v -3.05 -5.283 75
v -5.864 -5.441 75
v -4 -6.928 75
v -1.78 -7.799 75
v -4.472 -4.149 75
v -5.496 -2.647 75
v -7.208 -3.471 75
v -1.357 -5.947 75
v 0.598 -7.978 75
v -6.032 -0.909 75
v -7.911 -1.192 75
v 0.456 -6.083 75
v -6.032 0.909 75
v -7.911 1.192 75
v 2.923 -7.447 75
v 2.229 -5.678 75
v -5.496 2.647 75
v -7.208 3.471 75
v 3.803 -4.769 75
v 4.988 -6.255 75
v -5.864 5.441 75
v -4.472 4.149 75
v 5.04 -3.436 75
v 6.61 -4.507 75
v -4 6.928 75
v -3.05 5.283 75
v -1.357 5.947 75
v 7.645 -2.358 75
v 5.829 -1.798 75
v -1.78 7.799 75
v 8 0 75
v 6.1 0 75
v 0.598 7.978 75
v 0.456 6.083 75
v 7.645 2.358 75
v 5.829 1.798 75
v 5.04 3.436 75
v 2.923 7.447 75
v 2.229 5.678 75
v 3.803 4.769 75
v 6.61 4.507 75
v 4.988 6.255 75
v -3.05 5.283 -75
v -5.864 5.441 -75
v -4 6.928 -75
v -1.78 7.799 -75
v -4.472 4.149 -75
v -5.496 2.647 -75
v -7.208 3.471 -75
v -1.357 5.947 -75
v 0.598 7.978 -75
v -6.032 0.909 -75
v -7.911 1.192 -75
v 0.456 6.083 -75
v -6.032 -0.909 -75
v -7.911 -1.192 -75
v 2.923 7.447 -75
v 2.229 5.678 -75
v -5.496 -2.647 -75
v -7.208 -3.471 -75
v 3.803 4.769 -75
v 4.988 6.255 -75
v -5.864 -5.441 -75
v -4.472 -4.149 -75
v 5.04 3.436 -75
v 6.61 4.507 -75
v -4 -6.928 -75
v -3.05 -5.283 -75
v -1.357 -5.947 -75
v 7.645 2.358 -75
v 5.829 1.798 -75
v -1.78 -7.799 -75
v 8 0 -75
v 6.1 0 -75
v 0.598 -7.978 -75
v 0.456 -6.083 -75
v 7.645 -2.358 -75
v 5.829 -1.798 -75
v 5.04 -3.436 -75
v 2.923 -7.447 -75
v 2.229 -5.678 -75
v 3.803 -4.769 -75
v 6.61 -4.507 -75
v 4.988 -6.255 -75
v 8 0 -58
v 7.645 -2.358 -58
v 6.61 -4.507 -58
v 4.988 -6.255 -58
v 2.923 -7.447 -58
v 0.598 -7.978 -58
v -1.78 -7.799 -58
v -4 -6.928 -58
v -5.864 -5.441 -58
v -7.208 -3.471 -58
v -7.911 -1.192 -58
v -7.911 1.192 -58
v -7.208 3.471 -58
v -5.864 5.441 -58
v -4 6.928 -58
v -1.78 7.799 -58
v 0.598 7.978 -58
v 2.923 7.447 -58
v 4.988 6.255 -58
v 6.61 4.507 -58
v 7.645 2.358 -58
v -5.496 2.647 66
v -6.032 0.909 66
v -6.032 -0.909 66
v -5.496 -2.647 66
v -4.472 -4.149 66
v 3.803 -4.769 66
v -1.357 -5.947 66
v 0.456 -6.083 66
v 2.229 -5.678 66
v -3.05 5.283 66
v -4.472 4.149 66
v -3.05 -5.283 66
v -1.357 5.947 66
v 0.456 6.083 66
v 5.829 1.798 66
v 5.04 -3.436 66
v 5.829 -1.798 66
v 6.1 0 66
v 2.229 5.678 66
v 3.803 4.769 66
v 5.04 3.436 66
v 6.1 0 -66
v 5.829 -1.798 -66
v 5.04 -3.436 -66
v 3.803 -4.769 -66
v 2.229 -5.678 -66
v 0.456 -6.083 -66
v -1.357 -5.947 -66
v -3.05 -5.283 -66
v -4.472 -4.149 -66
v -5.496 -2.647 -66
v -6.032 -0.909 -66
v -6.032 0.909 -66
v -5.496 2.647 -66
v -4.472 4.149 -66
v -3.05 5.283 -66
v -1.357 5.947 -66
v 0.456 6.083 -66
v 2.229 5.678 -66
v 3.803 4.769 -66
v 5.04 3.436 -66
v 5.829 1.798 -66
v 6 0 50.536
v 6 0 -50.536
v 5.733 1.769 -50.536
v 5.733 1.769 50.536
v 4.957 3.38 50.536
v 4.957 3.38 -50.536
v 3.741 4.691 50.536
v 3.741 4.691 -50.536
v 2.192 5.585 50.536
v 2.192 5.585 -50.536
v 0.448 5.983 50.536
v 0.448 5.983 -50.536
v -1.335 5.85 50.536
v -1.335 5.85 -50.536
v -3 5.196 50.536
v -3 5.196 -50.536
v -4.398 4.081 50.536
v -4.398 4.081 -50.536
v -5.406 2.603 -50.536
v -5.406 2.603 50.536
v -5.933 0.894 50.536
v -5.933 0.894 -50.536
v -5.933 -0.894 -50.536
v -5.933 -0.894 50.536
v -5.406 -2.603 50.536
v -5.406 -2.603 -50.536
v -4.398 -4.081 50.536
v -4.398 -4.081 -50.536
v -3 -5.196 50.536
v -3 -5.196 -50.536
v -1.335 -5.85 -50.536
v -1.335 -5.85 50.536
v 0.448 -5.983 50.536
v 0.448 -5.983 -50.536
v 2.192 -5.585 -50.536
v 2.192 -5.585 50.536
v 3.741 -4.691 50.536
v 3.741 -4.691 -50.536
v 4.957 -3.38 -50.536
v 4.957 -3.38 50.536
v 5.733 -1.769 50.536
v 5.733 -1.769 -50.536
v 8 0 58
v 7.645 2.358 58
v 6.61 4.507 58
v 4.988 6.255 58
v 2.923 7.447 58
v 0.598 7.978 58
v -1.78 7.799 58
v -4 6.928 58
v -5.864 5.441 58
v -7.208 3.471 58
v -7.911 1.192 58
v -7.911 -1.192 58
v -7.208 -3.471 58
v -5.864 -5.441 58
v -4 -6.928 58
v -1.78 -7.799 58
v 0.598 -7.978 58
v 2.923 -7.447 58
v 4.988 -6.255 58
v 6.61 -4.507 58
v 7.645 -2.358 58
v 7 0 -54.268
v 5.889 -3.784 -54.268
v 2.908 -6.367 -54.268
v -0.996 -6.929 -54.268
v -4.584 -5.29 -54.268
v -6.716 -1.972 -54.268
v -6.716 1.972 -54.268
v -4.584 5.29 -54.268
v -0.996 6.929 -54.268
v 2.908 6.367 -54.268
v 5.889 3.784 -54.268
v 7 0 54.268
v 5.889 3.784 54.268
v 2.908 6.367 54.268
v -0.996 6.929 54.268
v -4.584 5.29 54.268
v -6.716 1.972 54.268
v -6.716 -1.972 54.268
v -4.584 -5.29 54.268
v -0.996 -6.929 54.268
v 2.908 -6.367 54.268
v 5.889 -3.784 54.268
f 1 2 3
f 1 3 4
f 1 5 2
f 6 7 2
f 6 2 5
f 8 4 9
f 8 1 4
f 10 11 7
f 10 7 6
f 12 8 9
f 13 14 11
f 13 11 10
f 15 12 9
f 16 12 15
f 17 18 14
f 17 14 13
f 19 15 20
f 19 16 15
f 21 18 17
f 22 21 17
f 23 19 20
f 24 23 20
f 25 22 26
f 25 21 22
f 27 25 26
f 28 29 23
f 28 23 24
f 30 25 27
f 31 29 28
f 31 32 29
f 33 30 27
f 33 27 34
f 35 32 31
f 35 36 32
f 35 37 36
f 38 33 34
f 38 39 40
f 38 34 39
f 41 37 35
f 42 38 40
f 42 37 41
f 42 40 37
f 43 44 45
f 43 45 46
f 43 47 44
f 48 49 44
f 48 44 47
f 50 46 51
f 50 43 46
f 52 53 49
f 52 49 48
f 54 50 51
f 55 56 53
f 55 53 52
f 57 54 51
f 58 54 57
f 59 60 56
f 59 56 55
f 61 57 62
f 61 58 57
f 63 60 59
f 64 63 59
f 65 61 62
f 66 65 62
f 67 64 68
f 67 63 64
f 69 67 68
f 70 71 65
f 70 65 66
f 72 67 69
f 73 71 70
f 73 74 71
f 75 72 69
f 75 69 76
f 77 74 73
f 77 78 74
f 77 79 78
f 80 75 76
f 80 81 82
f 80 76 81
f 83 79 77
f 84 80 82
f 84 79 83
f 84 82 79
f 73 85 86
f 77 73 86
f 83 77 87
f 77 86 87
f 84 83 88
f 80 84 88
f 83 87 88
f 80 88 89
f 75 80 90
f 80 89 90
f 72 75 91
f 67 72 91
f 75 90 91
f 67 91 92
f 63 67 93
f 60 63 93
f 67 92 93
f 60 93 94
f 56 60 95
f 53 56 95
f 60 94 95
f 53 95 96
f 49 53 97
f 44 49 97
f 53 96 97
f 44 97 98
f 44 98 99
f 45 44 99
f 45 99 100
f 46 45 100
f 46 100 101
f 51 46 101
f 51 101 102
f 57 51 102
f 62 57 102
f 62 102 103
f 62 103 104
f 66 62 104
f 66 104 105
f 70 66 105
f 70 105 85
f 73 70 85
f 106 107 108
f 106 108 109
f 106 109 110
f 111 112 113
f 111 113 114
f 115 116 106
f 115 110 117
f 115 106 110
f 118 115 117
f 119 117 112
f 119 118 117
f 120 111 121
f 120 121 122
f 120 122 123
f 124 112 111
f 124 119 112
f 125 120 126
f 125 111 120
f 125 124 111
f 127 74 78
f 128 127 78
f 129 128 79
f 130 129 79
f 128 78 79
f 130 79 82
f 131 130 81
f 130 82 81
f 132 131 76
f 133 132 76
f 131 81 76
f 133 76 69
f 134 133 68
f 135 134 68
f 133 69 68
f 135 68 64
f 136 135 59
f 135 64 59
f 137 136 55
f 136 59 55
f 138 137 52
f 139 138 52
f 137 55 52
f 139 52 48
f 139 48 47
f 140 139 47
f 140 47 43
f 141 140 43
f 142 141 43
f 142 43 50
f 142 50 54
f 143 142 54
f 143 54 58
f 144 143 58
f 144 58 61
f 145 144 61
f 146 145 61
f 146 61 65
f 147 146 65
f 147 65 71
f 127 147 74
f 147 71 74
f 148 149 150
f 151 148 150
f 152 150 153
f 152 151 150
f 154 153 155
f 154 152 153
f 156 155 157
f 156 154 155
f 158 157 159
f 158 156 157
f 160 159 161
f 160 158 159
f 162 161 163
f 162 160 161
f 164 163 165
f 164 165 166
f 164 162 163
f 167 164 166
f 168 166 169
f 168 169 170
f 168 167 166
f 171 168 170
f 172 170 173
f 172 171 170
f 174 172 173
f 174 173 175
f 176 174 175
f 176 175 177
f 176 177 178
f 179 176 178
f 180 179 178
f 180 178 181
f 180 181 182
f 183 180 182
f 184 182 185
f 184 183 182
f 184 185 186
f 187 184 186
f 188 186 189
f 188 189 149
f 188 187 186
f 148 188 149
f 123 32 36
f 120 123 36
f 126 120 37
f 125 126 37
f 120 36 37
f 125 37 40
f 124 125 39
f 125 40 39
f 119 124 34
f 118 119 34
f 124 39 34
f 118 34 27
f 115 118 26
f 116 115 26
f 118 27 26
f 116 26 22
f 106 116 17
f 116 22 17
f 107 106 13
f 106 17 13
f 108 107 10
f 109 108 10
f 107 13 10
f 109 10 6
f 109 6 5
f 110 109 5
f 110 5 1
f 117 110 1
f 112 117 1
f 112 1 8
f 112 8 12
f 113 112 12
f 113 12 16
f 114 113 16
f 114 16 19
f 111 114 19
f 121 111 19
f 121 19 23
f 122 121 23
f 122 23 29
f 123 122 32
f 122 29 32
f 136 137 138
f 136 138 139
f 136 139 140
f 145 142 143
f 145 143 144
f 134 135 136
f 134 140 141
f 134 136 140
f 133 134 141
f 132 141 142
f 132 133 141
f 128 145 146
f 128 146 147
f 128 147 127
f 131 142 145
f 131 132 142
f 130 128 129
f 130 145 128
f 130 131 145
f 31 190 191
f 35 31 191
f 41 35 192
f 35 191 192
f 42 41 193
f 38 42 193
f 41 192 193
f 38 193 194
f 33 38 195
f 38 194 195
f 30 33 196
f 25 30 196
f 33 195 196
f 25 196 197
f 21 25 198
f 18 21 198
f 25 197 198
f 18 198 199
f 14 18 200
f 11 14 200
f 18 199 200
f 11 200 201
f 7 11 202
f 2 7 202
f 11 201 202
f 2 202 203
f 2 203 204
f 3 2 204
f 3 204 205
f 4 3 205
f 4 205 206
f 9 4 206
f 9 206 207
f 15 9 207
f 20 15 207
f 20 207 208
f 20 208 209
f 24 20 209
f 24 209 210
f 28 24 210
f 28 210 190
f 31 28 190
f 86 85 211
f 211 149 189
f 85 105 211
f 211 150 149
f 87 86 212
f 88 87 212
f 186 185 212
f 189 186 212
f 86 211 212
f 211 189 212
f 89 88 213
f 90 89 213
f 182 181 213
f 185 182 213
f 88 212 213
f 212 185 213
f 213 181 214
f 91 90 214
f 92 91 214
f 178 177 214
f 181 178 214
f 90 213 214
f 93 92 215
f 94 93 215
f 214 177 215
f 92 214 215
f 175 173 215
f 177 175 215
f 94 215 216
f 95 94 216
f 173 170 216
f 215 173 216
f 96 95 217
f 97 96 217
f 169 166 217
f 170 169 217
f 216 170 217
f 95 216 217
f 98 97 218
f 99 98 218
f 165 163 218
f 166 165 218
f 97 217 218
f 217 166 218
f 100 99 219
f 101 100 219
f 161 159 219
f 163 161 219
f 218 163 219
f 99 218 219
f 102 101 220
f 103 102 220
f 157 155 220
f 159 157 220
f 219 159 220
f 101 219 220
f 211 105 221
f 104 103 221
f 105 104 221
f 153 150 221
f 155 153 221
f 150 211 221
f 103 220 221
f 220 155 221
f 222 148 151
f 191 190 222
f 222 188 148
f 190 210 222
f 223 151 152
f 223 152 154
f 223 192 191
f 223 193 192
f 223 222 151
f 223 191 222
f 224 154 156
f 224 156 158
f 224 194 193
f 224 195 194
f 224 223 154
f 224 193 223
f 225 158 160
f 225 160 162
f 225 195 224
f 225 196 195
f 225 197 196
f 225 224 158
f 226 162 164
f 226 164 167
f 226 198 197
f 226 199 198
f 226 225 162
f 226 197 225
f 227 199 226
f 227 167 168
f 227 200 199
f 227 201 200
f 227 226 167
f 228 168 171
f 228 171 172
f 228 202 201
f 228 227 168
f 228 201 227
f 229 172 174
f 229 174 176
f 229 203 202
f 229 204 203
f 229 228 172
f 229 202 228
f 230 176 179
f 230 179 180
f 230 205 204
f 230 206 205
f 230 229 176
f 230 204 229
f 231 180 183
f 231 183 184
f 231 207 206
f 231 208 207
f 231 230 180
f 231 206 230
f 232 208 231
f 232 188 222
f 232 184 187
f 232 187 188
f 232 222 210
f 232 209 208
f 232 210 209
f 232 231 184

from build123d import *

# Parameters (mm, degrees)
F0_R          = 6
F1_DEPTH      = 50
F1_DEPTH_BACK = 50
F2_R          = 8
F2_R_2        = 6
F4_DEPTH      = 25
F3_R          = 8
F3_R_2        = 6
F5_DEPTH      = 25
F6_S5_R       = 6
F6_T6_DEPTH   = 14
F6_S11_R      = 6
F6_T12_DEPTH  = 14
F7_R          = 6.1
F8_DEPTH      = 9
F9_R          = 6.1
F10_DEPTH     = 9


# Not quite as in the source:
# - a fillet or chamfer that OpenCascade refuses, or shapes differently, is made with other operations: its cross-section is extruded or revolved along the edge and cut away or added


with BuildPart() as f1:
    # F0 (on Top) → F1 (new body, two sides)
    with BuildSketch(Plane.XY) as f1_sk:
        Circle(F0_R)
    extrude(amount=F1_DEPTH)
    extrude(f1_sk.sketch, amount=-F1_DEPTH_BACK)

    # F2 (on face) → F4 (join)
    with BuildSketch(Plane.XY.offset(50)):
        Circle(F2_R)
        Circle(F2_R_2, mode=Mode.SUBTRACT)
        Circle(F2_R_2)
    extrude(amount=F4_DEPTH)

    # F3 (on face) → F5 (join)
    with BuildSketch(Plane(origin=(0, 0, -50), x_dir=(1, 0, 0), z_dir=(0, 0, -1))):
        Circle(F3_R)
        Circle(F3_R_2, mode=Mode.SUBTRACT)
        Circle(F3_R_2)
    extrude(amount=F5_DEPTH)

    # F6: chamfer of 8 x 2.1435935394 on 2 edges, made by hand


with BuildPart() as f6_tool2:
    # F6_s3 → F6_t4 (revolve)
    with BuildSketch(Plane.XZ):
        Polygon((8, -58), (5.8564064606, -50), (8, -50), align=None)
    revolve(axis=Axis((0, 0, -50), (0, 0, -1)))

    # F6_s5 → F6_t6 (cut, symmetric)
    with BuildSketch(Plane.XY.offset(-54)):
        Circle(F6_S5_R)
    extrude(amount=F6_T6_DEPTH, both=True, mode=Mode.SUBTRACT)


with BuildPart() as f1_1:
    add(f1.part)

    # F6_t1: cut F6_tool2
    add(f6_tool2.part, mode=Mode.SUBTRACT)


with BuildPart() as f6_tool8:
    # F6_s9 → F6_t10 (revolve)
    with BuildSketch(Plane.XZ):
        Polygon((5.8564064606, 50), (8, 58), (8, 50), align=None)
    revolve(axis=Axis((0, 0, 50), (0, 0, 1)))

    # F6_s11 → F6_t12 (cut, symmetric)
    with BuildSketch(Plane.XY.offset(54)):
        Circle(F6_S11_R)
    extrude(amount=F6_T12_DEPTH, both=True, mode=Mode.SUBTRACT)


with BuildPart() as f1_2:
    add(f1_1.part)

    # F6_t7: cut F6_tool8
    add(f6_tool8.part, mode=Mode.SUBTRACT)

    # F7 (on face) → F8 (cut)
    with BuildSketch(Plane(origin=(0, 0, -75), x_dir=(1, 0, 0), z_dir=(0, 0, -1))):
        Circle(F7_R)
    extrude(amount=-F8_DEPTH, mode=Mode.SUBTRACT)

    # F9 (on face) → F10 (cut)
    with BuildSketch(Plane.XY.offset(75)):
        Circle(F9_R)
    extrude(amount=-F10_DEPTH, mode=Mode.SUBTRACT)


solid = f1_2.part
